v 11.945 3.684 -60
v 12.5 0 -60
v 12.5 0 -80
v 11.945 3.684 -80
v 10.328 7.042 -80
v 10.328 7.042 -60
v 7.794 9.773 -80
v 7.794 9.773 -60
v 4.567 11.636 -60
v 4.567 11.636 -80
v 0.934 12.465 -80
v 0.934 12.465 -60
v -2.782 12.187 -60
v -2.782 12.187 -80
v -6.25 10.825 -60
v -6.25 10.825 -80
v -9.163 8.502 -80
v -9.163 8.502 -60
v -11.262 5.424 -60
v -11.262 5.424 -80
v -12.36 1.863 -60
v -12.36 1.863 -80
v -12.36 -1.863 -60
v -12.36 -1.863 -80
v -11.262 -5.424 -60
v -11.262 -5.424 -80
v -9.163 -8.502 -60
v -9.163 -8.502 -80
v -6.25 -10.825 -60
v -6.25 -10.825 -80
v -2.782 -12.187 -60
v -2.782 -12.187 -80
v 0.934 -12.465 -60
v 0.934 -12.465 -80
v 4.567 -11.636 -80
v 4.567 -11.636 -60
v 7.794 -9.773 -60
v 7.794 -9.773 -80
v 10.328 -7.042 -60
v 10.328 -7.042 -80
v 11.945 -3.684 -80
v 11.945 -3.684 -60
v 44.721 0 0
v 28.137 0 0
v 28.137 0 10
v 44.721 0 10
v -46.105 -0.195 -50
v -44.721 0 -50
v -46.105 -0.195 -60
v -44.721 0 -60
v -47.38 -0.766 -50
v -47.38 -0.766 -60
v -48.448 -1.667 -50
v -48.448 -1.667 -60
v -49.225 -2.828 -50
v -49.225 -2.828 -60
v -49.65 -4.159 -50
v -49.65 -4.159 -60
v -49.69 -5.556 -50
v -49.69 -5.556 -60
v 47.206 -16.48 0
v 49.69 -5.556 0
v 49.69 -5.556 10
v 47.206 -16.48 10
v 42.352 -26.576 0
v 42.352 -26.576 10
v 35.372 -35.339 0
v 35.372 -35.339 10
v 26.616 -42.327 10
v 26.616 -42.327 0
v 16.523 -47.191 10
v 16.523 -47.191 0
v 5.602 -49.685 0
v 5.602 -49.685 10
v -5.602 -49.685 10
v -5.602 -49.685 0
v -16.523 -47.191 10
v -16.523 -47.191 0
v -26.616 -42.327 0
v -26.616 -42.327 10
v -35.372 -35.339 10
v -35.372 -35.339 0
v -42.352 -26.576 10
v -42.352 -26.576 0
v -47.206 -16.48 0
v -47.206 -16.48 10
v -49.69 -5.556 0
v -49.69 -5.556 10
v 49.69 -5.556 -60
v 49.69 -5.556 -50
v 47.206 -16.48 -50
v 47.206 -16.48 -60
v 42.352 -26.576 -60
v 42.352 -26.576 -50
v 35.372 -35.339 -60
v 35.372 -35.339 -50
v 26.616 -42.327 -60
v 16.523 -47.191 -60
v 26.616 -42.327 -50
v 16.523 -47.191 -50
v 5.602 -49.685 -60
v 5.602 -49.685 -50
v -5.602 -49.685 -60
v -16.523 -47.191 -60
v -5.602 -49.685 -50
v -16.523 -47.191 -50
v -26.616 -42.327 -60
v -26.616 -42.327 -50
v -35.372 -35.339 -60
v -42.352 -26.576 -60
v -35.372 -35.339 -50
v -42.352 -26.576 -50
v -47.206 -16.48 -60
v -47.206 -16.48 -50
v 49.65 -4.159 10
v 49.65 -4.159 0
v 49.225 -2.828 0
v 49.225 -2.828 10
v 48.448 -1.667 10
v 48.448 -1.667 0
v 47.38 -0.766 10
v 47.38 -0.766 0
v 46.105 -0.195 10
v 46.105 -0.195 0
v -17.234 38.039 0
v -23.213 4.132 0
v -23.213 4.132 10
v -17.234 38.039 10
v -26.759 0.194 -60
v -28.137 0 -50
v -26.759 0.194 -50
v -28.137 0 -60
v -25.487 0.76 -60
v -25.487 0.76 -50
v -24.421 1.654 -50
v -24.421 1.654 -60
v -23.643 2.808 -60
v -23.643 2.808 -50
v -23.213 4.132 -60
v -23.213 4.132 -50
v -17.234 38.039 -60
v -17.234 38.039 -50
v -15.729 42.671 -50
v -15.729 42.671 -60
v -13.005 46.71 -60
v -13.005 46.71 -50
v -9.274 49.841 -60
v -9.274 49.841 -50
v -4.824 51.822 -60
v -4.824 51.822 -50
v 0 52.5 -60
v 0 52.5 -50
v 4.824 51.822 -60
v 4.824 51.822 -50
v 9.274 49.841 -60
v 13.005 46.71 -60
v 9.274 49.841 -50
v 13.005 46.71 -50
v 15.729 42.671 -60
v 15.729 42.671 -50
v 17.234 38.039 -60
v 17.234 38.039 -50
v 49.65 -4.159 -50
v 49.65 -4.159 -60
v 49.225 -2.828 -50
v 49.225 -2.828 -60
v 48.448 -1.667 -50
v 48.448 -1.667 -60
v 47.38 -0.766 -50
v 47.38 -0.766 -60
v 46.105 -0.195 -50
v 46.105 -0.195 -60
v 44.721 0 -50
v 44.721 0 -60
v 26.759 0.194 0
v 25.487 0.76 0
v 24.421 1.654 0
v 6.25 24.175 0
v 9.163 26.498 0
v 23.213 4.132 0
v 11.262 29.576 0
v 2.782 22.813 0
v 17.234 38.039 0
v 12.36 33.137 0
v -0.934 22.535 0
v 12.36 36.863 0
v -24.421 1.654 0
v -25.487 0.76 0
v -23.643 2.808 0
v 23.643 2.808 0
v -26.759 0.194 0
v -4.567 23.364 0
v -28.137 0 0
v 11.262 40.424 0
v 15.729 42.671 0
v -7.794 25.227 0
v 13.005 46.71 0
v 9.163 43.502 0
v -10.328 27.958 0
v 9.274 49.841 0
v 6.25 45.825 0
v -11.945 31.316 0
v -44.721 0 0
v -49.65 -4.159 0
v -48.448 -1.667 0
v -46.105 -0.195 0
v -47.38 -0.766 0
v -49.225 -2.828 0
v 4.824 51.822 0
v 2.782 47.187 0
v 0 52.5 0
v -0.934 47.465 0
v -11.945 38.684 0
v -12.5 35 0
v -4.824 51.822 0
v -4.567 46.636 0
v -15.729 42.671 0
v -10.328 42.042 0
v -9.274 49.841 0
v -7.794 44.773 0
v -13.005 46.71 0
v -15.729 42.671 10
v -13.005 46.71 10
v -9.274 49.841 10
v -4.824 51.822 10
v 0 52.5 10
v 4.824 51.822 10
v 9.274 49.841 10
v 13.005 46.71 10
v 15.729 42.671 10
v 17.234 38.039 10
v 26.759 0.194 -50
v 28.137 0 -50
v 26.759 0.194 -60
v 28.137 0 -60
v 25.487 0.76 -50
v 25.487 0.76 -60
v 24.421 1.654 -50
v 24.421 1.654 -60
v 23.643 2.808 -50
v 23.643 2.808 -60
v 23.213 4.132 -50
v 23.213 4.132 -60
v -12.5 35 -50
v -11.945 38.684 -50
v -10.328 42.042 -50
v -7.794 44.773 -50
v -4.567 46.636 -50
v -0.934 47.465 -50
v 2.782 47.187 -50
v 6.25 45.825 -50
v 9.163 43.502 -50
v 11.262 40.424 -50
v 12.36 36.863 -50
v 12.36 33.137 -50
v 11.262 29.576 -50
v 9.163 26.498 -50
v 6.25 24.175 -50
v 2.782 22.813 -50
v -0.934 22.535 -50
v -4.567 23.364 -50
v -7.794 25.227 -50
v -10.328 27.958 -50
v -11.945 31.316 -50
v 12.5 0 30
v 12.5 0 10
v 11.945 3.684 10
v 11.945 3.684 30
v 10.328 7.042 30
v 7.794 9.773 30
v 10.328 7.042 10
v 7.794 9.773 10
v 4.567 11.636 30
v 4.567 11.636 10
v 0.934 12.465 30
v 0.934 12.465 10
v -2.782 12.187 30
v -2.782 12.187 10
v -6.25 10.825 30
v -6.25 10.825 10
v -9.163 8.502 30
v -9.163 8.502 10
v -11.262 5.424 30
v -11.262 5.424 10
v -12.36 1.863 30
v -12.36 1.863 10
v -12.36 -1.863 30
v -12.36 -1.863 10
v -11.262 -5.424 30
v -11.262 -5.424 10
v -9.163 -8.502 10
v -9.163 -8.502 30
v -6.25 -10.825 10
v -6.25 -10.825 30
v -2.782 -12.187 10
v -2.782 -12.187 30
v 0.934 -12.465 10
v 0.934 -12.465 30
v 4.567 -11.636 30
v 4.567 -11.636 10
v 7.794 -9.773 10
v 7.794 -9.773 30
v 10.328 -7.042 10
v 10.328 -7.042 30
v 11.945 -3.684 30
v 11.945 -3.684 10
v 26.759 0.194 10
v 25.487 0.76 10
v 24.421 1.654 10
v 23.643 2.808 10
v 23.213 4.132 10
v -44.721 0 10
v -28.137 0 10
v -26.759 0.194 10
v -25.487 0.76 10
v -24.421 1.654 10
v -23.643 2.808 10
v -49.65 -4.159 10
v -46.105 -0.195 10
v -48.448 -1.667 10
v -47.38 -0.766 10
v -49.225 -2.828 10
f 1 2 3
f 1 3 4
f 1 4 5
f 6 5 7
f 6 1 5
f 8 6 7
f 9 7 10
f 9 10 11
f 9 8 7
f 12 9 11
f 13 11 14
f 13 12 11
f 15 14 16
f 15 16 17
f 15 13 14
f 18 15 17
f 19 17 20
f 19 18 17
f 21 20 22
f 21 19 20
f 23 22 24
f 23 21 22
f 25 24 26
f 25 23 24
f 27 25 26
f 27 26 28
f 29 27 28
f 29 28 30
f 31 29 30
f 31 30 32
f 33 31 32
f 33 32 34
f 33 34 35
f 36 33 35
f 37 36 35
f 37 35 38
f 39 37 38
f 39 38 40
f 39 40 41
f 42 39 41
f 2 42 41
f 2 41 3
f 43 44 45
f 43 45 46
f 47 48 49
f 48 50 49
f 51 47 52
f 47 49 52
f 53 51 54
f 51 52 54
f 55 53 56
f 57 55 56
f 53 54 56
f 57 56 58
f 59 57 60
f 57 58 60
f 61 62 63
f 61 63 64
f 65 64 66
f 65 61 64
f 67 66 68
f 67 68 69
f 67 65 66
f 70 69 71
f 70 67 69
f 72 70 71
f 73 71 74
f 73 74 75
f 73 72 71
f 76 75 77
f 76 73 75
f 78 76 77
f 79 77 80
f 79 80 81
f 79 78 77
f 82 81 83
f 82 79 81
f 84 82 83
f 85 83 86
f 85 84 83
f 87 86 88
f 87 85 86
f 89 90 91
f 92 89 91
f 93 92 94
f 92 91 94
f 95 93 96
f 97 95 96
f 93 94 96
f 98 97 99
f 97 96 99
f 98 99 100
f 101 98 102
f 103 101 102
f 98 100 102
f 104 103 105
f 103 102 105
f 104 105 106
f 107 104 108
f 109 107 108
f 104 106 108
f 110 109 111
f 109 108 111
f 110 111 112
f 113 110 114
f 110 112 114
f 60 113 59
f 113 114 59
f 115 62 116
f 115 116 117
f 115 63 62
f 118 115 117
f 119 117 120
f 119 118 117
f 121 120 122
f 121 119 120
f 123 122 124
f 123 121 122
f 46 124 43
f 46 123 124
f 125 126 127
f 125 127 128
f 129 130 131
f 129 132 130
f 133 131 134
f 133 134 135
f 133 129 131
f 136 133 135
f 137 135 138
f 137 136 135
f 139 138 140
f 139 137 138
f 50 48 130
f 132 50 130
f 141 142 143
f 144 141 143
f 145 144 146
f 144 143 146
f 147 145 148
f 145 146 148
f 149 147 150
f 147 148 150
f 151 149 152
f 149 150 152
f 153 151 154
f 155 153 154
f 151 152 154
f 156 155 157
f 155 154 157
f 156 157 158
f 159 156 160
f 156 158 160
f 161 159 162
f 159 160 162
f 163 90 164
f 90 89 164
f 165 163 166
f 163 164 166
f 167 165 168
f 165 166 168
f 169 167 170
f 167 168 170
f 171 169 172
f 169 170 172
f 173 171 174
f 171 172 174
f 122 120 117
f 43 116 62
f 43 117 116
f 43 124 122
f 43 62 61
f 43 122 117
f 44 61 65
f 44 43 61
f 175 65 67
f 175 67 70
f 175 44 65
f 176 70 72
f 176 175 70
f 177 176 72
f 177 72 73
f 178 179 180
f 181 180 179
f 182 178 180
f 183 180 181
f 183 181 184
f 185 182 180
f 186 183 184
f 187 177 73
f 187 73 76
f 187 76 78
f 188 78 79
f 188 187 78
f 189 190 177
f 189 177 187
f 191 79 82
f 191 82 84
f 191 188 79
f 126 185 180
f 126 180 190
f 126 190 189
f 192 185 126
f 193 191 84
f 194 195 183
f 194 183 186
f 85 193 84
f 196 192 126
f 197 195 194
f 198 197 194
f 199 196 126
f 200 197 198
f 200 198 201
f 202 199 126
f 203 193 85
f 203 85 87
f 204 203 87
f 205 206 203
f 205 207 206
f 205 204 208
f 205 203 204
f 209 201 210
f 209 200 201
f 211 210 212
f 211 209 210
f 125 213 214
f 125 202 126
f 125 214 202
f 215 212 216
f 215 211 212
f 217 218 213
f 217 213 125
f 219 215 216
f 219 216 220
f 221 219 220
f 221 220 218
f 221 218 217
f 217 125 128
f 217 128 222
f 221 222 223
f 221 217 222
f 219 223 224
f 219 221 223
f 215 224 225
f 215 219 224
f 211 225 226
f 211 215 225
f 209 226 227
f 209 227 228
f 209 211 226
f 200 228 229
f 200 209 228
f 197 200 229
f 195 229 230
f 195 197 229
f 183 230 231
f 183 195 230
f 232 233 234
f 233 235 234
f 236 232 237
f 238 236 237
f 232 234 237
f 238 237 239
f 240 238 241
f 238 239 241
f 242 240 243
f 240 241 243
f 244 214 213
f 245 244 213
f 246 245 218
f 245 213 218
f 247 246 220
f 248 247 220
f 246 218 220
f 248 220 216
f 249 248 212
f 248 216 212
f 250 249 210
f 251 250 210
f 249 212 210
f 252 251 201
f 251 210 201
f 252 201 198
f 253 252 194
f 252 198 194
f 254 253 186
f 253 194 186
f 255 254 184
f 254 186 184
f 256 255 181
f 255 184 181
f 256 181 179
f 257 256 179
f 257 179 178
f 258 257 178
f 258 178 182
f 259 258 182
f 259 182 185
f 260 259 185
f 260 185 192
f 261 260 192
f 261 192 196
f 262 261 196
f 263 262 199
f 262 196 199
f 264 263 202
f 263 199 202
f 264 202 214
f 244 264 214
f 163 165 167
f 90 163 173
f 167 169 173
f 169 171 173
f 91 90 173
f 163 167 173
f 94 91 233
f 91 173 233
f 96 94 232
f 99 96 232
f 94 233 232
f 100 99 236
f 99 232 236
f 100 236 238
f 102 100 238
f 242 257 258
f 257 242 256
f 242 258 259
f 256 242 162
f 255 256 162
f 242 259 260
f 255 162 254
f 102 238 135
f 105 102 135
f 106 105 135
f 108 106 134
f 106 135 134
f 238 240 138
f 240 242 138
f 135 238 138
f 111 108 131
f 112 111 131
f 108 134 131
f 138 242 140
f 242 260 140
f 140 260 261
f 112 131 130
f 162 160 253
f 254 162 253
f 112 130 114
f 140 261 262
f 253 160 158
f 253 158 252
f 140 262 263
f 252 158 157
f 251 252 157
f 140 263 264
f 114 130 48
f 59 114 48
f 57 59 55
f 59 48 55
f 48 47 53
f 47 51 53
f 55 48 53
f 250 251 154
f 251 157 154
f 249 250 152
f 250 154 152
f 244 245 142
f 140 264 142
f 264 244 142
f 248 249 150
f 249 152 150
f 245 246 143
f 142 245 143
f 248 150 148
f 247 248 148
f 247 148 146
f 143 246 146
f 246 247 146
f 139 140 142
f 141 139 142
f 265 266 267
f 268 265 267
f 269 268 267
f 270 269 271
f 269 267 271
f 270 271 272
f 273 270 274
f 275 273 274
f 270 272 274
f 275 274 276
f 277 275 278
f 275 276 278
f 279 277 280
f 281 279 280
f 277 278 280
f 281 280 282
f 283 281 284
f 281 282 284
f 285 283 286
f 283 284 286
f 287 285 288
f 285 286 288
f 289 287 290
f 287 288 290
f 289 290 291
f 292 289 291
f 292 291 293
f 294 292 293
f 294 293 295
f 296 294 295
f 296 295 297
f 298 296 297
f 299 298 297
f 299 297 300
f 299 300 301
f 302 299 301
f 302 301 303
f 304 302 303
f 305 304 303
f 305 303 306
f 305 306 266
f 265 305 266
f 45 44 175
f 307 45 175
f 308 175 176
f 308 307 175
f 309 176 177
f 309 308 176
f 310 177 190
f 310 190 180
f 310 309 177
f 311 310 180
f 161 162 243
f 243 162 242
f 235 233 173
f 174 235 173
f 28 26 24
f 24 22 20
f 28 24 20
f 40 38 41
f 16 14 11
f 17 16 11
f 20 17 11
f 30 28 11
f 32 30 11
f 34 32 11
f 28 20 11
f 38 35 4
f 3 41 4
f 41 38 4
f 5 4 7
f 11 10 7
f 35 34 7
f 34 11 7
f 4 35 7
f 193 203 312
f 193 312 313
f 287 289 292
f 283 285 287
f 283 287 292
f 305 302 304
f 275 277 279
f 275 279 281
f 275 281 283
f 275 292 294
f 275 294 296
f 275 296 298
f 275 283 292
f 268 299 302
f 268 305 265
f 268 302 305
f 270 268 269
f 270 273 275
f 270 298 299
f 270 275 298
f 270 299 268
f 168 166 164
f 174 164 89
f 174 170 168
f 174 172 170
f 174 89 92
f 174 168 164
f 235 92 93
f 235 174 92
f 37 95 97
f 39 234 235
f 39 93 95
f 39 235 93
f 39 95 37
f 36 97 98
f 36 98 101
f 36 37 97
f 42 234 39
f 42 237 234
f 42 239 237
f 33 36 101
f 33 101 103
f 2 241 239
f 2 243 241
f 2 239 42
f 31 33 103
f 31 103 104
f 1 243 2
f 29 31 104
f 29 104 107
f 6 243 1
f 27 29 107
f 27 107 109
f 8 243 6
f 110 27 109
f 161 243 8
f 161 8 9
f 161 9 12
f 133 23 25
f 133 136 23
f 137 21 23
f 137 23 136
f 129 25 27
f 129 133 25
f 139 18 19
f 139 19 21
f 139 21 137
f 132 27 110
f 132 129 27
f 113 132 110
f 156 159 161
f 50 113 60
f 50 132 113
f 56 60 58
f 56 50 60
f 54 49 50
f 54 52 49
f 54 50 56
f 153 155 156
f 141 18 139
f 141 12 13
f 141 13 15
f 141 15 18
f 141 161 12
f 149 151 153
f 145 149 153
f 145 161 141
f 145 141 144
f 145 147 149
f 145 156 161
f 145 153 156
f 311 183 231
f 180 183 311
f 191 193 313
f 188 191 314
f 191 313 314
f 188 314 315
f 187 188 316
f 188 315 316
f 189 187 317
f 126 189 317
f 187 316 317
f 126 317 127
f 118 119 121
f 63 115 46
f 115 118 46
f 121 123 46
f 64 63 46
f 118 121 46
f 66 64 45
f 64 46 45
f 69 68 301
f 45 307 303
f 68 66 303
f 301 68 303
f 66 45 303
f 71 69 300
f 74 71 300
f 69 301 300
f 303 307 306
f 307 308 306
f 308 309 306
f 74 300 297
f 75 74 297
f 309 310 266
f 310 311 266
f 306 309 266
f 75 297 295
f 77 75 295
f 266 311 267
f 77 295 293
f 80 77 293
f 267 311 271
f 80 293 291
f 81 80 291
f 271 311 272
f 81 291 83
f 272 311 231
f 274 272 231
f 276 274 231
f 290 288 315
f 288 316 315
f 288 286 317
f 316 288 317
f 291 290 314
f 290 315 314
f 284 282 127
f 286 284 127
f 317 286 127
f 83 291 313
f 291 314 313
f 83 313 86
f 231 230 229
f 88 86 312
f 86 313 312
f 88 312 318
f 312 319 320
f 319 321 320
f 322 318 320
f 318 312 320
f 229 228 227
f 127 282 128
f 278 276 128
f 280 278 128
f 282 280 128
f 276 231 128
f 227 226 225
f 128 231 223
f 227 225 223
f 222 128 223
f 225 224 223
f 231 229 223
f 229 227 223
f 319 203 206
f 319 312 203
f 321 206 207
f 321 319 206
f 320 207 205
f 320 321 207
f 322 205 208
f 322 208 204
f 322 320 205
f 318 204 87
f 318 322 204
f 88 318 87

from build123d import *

# Parameters (mm, degrees)
SKETCH1_R            = 12.5
BOSS_EXTRUDE1_DEPTH  = 10
FILLET1_R            = 5
SKETCH1_2_R          = 12.5
BOSS_EXTRUDE2_DEPTH  = 30
SKETCH2_R            = 12.5
BOSS_EXTRUDE3_DEPTH  = 50
FILLET1_OF_MIRROR1_R = 5


with BuildPart() as part:
    # Sketch1 → Boss-Extrude1 (new body)
    with BuildSketch(Plane.XY):
        with BuildLine():
            Line((-50, 0), (-23.941410033, 0))
            Line((-23.941410033, 0), (-17.234135678, 38.038843109))
            ThreePointArc((-17.234135678, 38.038843109), (0, 52.5), (17.234135678, 38.038843109))
            Line((17.234135678, 38.038843109), (23.941410033, 0))
            Line((23.941410033, 0), (50, 0))
            ThreePointArc((50, 0), (0, -50), (-50, 0))
        make_face()
        Circle(SKETCH1_R, mode=Mode.SUBTRACT)
    boss_extrude1 = extrude(amount=BOSS_EXTRUDE1_DEPTH)

    # Fillet1
    fillet1_edges = [part.edges().sort_by_distance(p)[0] for p in [
        (-50, 0, 5),
        (-23.941410033, 0, 5),
        (23.941410033, 0, 5),
        (50, 0, 5),
    ]]
    fillet(fillet1_edges, radius=FILLET1_R)

    # Sketch1<2> → Boss-Extrude2 (add)
    with BuildSketch(Plane.XY):
        Circle(SKETCH1_2_R)
    boss_extrude2 = extrude(amount=BOSS_EXTRUDE2_DEPTH)

    # Sketch2 → Boss-Extrude3 (add)
    with BuildSketch(Plane(origin=(0, 0, 0), x_dir=(-1, 0, 0), z_dir=(0, 0, -1))):
        with Locations((0, 35)):
            Circle(SKETCH2_R)
    extrude(amount=BOSS_EXTRUDE3_DEPTH)

    # Mirror1: Boss-Extrude1, Boss-Extrude2 across plane
    add(boss_extrude1.mirror(Plane(origin=(0, 0, -25), x_dir=(1, 0, 0), z_dir=(0, 0, -1))))
    add(boss_extrude2.mirror(Plane(origin=(0, 0, -25), x_dir=(1, 0, 0), z_dir=(0, 0, -1))))

    # Fillet1 of Mirror1
    fillet1_of_mirror1_edges = [part.edges().sort_by_distance(p)[0] for p in [
        (-50, 0, -55),
        (-23.941410033, 0, -55),
        (23.941410033, 0, -55),
        (50, 0, -55),
    ]]
    fillet(fillet1_of_mirror1_edges, radius=FILLET1_OF_MIRROR1_R)


solid = part.part
